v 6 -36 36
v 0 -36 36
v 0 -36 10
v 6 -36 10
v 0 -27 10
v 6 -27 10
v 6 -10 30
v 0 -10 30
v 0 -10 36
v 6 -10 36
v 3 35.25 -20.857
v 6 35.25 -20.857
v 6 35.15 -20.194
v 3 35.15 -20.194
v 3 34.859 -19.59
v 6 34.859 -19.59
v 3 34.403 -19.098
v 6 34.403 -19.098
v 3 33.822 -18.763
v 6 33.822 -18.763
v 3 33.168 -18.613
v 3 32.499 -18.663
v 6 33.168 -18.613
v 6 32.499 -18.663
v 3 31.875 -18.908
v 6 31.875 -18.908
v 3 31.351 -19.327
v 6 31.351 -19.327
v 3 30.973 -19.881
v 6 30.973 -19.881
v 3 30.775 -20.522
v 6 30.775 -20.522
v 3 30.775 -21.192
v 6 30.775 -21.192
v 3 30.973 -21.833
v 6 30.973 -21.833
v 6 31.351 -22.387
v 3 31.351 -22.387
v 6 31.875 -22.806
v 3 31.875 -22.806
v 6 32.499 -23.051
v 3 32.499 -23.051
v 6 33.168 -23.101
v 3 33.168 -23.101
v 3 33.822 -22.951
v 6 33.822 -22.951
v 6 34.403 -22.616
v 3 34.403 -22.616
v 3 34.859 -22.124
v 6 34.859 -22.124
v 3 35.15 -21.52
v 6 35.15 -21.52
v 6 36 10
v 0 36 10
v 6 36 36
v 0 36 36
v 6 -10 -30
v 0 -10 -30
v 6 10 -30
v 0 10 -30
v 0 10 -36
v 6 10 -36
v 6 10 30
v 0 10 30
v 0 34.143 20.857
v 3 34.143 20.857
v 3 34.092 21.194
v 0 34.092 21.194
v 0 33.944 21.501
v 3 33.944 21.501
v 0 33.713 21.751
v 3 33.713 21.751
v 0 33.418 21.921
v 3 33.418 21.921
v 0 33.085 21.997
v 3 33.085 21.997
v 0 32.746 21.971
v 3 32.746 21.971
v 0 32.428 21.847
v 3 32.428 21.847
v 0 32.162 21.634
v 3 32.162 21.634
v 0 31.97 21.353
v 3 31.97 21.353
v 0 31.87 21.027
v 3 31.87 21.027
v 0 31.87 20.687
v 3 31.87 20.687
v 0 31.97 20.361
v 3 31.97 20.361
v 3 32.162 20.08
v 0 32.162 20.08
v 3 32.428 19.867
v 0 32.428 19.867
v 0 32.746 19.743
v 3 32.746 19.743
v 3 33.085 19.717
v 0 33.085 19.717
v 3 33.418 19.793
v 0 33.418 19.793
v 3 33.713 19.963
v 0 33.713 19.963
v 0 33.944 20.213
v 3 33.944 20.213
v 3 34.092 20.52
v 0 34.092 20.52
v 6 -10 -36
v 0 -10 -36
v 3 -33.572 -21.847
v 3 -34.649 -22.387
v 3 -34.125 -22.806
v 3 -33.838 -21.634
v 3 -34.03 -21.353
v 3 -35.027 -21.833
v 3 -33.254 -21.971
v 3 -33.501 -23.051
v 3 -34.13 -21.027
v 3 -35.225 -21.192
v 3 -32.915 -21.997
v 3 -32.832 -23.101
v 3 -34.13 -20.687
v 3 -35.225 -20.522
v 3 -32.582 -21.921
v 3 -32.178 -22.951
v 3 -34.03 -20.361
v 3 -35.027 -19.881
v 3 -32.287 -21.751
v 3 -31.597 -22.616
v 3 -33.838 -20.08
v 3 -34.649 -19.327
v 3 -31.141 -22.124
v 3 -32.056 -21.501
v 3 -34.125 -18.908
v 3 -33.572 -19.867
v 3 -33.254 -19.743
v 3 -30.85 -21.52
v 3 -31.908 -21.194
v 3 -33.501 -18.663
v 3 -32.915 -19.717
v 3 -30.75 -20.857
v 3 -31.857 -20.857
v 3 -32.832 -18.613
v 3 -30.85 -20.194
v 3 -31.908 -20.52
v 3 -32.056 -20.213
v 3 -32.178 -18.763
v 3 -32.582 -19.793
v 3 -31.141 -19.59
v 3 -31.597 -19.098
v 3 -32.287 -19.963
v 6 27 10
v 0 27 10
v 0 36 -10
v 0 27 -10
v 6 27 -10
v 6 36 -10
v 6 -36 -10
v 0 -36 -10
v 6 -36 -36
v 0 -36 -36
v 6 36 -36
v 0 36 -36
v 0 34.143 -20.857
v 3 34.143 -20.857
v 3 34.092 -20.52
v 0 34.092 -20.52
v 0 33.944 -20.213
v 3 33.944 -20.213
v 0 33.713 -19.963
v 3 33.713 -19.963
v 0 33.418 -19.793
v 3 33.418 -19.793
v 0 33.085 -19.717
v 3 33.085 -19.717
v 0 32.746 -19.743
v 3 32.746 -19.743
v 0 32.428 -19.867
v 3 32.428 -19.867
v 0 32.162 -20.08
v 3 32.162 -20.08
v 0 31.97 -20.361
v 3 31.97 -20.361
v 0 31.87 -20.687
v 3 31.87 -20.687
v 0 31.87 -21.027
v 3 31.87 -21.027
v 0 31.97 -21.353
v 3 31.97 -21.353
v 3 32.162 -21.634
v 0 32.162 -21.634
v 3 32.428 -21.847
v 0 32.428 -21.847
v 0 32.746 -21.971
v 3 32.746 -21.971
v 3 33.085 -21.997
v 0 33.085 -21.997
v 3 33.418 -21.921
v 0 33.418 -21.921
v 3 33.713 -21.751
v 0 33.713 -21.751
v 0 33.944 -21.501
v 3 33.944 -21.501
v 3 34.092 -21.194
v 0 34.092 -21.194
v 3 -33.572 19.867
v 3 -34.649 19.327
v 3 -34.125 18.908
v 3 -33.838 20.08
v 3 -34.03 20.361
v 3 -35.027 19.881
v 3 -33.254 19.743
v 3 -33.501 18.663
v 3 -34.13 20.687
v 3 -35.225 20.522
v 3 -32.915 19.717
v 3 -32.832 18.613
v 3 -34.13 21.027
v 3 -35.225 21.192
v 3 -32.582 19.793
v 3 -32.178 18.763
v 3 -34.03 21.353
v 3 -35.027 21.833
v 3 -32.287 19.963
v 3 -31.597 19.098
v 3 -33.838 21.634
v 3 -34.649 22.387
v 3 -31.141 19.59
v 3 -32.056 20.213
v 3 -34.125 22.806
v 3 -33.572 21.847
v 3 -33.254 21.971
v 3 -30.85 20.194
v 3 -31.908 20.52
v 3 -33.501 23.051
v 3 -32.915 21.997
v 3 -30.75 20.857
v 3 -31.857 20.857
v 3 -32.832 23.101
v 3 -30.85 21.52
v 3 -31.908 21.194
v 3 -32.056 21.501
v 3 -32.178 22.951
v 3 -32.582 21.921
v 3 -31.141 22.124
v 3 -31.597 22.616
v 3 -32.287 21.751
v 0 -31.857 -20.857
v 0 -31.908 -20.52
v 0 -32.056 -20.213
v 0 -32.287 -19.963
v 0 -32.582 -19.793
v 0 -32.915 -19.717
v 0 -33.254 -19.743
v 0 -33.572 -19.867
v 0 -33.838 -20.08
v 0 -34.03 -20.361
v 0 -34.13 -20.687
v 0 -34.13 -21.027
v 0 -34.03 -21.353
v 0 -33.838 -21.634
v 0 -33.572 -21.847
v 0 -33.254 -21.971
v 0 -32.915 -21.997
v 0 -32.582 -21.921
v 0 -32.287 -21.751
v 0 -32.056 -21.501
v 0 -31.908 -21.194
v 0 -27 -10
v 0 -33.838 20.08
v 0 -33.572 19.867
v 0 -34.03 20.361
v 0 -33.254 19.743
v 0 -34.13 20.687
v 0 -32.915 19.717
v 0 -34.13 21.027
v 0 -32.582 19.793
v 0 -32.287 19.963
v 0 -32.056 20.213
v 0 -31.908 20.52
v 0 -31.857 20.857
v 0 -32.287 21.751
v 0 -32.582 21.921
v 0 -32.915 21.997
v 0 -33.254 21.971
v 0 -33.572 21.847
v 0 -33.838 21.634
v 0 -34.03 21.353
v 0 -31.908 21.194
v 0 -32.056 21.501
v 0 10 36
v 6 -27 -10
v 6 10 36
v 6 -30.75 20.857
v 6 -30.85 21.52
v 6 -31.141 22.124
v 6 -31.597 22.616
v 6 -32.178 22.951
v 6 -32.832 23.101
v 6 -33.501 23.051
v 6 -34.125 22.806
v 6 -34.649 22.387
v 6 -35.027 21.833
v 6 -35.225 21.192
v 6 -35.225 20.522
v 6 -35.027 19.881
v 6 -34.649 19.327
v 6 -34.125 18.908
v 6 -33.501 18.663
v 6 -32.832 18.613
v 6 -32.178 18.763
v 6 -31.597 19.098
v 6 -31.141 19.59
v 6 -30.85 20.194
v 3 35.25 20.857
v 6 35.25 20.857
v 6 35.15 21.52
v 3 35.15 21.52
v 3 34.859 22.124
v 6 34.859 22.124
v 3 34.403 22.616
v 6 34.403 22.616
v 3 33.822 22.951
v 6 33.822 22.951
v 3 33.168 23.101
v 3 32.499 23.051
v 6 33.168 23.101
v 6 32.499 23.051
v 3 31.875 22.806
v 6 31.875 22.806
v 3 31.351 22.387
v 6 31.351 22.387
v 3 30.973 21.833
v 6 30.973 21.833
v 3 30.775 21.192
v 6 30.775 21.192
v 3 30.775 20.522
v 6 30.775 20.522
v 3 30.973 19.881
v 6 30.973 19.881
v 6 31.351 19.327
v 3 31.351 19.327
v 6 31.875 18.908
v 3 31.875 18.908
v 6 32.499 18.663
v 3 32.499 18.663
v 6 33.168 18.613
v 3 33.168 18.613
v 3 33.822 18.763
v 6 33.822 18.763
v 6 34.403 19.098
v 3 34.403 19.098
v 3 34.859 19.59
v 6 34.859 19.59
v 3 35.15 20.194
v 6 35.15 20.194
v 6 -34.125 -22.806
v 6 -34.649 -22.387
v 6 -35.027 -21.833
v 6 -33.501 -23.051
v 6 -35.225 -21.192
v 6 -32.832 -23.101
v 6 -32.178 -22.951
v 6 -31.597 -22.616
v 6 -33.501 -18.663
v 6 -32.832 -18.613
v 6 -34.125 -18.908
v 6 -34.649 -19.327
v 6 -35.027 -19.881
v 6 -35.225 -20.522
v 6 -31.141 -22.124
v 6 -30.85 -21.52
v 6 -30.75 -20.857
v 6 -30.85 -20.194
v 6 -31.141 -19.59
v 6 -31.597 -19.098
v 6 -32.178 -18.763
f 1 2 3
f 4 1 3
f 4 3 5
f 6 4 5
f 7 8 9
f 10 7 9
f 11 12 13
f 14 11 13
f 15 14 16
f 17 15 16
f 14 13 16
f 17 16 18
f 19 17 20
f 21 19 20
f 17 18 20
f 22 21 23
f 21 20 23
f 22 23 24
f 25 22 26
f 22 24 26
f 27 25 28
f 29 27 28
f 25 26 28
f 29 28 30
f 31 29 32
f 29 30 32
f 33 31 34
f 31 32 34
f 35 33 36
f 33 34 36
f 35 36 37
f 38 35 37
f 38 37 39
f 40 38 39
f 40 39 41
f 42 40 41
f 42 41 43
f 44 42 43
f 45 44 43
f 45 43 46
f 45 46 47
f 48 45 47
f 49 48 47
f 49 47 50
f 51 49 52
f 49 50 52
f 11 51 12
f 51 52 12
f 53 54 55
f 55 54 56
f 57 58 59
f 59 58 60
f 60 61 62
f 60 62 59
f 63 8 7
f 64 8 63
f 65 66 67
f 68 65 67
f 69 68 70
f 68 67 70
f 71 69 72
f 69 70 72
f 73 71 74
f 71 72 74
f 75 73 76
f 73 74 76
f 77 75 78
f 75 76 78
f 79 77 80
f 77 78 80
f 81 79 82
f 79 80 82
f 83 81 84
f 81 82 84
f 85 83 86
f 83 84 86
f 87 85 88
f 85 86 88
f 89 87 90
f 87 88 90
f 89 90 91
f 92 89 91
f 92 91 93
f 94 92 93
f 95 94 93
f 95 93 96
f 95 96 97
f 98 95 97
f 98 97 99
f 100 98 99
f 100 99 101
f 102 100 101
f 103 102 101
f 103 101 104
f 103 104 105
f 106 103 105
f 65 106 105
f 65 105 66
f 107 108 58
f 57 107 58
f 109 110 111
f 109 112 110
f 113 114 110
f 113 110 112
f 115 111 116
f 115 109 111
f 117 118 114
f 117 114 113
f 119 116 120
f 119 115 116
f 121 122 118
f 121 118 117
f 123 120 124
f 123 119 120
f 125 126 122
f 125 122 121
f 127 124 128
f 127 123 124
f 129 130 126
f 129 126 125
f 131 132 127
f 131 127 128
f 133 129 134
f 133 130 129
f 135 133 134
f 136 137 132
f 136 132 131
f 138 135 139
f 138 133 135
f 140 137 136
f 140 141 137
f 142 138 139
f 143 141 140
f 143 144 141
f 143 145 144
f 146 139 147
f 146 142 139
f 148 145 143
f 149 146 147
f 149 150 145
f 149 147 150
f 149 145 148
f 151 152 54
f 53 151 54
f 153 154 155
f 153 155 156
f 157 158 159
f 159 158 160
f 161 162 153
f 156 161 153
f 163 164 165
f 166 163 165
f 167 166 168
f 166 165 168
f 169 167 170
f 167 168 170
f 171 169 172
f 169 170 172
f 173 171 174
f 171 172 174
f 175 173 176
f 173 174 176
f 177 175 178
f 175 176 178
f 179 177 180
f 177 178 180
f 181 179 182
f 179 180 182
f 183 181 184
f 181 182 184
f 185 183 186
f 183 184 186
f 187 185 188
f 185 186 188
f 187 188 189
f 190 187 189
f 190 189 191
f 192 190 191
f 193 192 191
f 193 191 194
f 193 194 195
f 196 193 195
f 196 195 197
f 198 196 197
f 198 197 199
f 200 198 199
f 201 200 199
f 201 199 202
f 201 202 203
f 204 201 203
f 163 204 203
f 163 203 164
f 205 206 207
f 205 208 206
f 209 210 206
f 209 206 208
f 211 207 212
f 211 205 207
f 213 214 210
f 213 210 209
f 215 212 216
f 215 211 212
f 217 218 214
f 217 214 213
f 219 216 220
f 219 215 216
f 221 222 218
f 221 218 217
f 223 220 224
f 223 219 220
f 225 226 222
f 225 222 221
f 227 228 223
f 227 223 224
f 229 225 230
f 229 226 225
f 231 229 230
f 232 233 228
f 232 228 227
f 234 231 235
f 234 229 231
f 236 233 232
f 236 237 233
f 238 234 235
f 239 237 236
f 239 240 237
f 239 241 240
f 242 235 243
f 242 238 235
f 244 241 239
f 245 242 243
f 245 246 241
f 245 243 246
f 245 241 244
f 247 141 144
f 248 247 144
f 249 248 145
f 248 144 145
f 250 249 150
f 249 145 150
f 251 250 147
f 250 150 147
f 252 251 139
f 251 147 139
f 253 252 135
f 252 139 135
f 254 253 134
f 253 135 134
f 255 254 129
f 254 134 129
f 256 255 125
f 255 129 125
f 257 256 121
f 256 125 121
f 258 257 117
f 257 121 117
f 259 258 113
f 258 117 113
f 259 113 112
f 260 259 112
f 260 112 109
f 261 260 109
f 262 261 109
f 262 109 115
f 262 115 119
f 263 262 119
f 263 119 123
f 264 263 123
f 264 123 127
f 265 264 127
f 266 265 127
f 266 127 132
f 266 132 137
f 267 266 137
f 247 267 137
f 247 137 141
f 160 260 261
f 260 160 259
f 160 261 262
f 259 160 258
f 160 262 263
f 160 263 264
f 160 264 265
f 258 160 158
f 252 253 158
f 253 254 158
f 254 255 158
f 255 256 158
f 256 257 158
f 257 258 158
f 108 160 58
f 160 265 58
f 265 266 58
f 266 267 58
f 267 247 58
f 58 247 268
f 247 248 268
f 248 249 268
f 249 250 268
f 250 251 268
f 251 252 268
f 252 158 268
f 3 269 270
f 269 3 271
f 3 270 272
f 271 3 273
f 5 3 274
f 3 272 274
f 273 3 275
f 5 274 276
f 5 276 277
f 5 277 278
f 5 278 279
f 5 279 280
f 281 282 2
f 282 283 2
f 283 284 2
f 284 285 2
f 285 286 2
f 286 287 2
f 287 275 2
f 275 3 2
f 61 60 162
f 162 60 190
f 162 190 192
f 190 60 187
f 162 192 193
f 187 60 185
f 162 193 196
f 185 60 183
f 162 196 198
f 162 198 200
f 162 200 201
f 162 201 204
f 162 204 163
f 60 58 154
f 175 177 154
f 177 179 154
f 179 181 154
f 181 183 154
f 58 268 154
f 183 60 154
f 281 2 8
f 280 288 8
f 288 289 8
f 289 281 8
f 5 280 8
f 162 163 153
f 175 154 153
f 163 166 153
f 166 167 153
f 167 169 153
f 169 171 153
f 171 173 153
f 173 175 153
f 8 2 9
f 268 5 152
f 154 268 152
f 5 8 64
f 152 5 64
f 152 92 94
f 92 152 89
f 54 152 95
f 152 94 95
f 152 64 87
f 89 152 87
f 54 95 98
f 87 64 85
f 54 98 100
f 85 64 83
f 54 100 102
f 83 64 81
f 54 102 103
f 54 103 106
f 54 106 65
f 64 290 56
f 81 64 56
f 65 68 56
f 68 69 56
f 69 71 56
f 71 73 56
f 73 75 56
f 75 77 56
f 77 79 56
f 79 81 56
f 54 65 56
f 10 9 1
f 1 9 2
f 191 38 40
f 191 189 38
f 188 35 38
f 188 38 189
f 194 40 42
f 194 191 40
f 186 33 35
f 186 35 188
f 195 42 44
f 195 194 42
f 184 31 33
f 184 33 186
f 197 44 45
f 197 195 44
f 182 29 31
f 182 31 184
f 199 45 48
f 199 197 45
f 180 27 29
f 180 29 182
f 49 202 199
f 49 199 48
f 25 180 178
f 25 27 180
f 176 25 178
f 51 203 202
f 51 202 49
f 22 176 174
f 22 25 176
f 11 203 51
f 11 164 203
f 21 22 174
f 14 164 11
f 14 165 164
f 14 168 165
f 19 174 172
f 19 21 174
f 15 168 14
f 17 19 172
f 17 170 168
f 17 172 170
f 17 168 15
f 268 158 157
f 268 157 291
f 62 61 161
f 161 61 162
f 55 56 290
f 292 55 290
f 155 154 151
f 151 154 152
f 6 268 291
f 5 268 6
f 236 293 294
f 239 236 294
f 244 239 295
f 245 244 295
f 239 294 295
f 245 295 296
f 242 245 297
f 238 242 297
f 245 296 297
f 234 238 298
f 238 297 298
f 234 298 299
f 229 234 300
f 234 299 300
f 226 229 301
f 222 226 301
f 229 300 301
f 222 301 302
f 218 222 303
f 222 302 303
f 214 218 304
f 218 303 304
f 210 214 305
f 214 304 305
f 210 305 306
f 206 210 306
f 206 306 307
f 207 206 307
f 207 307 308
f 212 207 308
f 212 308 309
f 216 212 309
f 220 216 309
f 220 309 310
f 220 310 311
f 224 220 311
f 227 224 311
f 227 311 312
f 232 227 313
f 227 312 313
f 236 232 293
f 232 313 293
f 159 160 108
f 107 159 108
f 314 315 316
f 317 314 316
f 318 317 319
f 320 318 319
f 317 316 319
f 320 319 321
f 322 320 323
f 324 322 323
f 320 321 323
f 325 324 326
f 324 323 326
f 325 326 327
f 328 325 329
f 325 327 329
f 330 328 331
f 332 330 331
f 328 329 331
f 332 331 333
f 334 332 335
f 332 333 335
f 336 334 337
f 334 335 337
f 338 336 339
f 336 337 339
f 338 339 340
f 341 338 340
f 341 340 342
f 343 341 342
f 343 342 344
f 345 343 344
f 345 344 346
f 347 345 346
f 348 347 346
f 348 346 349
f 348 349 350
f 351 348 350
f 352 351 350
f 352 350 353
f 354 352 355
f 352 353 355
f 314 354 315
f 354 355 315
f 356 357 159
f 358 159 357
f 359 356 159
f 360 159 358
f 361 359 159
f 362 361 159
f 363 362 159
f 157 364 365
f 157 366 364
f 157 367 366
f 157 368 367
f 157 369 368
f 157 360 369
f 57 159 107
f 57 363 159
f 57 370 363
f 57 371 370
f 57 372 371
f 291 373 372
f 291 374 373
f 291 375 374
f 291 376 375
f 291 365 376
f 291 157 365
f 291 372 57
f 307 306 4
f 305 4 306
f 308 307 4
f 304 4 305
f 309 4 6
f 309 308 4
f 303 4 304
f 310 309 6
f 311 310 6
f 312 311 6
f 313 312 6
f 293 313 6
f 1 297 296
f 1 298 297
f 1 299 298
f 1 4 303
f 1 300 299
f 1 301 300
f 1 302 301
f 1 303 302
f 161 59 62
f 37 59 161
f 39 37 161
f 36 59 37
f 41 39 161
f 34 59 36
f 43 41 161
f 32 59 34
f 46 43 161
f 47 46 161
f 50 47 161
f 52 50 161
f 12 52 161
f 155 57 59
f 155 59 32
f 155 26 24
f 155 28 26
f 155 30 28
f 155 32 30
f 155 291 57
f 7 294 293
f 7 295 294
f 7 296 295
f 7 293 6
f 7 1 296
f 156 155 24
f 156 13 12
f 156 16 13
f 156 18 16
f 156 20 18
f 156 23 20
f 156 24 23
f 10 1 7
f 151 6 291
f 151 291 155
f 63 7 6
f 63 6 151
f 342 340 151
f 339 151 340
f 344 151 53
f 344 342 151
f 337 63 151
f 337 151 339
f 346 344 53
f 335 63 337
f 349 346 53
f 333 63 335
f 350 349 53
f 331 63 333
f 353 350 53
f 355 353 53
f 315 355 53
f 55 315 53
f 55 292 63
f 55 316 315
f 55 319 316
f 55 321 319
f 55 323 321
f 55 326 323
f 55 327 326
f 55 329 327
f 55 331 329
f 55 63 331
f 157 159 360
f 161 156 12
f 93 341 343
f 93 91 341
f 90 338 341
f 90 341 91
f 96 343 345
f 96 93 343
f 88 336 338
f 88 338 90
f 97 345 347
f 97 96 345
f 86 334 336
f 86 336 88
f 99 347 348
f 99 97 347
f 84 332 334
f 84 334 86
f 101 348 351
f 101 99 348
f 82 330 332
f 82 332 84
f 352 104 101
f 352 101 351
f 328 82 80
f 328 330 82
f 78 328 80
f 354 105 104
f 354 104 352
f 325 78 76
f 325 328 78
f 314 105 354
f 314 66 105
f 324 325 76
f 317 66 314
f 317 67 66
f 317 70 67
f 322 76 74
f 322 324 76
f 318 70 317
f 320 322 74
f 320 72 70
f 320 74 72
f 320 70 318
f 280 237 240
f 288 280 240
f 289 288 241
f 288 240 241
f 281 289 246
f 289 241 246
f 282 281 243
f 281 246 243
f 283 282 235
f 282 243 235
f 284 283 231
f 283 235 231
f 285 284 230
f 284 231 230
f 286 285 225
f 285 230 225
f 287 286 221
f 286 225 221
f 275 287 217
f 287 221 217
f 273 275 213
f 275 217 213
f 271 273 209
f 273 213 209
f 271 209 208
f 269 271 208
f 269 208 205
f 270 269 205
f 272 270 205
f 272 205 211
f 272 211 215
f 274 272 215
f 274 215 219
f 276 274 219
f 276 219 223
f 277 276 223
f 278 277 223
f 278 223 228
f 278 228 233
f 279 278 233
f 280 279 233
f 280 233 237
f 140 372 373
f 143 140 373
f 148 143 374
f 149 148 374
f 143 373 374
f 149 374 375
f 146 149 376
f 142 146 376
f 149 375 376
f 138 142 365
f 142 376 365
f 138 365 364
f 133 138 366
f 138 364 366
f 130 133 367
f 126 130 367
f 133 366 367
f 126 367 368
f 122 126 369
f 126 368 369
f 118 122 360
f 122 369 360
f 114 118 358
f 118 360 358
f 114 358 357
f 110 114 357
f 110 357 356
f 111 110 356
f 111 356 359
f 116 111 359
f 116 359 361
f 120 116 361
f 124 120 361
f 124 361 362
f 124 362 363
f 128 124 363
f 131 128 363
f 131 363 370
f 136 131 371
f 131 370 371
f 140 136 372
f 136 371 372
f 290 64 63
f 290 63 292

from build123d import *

# Parameters (mm, degrees)
F0_W     = 20
F0_H     = 6
F0_W_2   = 9
F0_H_2   = 20
F1_DEPTH = 6
F2_DEPTH = 6
F3_R     = 2.25
F3_R_2   = 1.143
F4_DEPTH = 3
F5_DEPTH = 6.001


with BuildPart() as f1:
    # F0 (on Right) → F1 (new body)
    with BuildSketch(Plane.YZ):
        Polygon((-36, -10), (-36, -36), (-10, -36), (-10, -30), (10, -30), (10, -36), (36, -36), (36, -10), (27, -10), (27, 10), (36, 10), (36, 36), (10, 36), (10, 30), (-10, 30), (-10, 36), (-36, 36), (-36, 10), (-27, 10), (-27, -10), align=None)
        with Locations((0, -33)):
            Rectangle(F0_W, F0_H)
        with Locations((-31.5, 0)):
            Rectangle(F0_W_2, F0_H_2)
        with Locations((31.5, 0)):
            Rectangle(F0_W_2, F0_H_2)
        with Locations((0, 33)):
            Rectangle(F0_W, F0_H)
    extrude(amount=F1_DEPTH)

    # F0 (on Right) → F2 (cut, through all)
    with BuildSketch(Plane.YZ):
        with Locations((0, 33)):
            Rectangle(F0_W, F0_H)
        with Locations((31.5, 0)):
            Rectangle(F0_W_2, F0_H_2)
        with Locations((0, -33)):
            Rectangle(F0_W, F0_H)
        with Locations((-31.5, 0)):
            Rectangle(F0_W_2, F0_H_2)
    extrude(amount=F2_DEPTH, mode=Mode.SUBTRACT)

    # F3 (on face) → F4 (cut)
    with BuildSketch(Plane.YZ.offset(6)):
        with Locations((-33, 20.857)):
            Circle(F3_R)
        with Locations((-33, 20.857)):
            Circle(F3_R_2, mode=Mode.SUBTRACT)
        with Locations((-33, -20.857)):
            Circle(F3_R)
        with Locations((-33, -20.857)):
            Circle(F3_R_2, mode=Mode.SUBTRACT)
        with Locations((33, 20.857)):
            Circle(F3_R)
        with Locations((33, 20.857)):
            Circle(F3_R_2, mode=Mode.SUBTRACT)
        with Locations((33, -20.857)):
            Circle(F3_R)
        with Locations((33, -20.857)):
            Circle(F3_R_2, mode=Mode.SUBTRACT)
    extrude(amount=-F4_DEPTH, mode=Mode.SUBTRACT)

    # F5 (cut, through all): faces of the model
    f5_faces = [f1.faces().sort_by_distance(p)[0] for p in [
        (6, -33, 20.857),
        (6, 33, 20.857),
        (6, 33, -20.857),
        (6, -33, -20.857),
    ]]
    extrude(f5_faces, amount=-F5_DEPTH, mode=Mode.SUBTRACT)


solid = f1.part
